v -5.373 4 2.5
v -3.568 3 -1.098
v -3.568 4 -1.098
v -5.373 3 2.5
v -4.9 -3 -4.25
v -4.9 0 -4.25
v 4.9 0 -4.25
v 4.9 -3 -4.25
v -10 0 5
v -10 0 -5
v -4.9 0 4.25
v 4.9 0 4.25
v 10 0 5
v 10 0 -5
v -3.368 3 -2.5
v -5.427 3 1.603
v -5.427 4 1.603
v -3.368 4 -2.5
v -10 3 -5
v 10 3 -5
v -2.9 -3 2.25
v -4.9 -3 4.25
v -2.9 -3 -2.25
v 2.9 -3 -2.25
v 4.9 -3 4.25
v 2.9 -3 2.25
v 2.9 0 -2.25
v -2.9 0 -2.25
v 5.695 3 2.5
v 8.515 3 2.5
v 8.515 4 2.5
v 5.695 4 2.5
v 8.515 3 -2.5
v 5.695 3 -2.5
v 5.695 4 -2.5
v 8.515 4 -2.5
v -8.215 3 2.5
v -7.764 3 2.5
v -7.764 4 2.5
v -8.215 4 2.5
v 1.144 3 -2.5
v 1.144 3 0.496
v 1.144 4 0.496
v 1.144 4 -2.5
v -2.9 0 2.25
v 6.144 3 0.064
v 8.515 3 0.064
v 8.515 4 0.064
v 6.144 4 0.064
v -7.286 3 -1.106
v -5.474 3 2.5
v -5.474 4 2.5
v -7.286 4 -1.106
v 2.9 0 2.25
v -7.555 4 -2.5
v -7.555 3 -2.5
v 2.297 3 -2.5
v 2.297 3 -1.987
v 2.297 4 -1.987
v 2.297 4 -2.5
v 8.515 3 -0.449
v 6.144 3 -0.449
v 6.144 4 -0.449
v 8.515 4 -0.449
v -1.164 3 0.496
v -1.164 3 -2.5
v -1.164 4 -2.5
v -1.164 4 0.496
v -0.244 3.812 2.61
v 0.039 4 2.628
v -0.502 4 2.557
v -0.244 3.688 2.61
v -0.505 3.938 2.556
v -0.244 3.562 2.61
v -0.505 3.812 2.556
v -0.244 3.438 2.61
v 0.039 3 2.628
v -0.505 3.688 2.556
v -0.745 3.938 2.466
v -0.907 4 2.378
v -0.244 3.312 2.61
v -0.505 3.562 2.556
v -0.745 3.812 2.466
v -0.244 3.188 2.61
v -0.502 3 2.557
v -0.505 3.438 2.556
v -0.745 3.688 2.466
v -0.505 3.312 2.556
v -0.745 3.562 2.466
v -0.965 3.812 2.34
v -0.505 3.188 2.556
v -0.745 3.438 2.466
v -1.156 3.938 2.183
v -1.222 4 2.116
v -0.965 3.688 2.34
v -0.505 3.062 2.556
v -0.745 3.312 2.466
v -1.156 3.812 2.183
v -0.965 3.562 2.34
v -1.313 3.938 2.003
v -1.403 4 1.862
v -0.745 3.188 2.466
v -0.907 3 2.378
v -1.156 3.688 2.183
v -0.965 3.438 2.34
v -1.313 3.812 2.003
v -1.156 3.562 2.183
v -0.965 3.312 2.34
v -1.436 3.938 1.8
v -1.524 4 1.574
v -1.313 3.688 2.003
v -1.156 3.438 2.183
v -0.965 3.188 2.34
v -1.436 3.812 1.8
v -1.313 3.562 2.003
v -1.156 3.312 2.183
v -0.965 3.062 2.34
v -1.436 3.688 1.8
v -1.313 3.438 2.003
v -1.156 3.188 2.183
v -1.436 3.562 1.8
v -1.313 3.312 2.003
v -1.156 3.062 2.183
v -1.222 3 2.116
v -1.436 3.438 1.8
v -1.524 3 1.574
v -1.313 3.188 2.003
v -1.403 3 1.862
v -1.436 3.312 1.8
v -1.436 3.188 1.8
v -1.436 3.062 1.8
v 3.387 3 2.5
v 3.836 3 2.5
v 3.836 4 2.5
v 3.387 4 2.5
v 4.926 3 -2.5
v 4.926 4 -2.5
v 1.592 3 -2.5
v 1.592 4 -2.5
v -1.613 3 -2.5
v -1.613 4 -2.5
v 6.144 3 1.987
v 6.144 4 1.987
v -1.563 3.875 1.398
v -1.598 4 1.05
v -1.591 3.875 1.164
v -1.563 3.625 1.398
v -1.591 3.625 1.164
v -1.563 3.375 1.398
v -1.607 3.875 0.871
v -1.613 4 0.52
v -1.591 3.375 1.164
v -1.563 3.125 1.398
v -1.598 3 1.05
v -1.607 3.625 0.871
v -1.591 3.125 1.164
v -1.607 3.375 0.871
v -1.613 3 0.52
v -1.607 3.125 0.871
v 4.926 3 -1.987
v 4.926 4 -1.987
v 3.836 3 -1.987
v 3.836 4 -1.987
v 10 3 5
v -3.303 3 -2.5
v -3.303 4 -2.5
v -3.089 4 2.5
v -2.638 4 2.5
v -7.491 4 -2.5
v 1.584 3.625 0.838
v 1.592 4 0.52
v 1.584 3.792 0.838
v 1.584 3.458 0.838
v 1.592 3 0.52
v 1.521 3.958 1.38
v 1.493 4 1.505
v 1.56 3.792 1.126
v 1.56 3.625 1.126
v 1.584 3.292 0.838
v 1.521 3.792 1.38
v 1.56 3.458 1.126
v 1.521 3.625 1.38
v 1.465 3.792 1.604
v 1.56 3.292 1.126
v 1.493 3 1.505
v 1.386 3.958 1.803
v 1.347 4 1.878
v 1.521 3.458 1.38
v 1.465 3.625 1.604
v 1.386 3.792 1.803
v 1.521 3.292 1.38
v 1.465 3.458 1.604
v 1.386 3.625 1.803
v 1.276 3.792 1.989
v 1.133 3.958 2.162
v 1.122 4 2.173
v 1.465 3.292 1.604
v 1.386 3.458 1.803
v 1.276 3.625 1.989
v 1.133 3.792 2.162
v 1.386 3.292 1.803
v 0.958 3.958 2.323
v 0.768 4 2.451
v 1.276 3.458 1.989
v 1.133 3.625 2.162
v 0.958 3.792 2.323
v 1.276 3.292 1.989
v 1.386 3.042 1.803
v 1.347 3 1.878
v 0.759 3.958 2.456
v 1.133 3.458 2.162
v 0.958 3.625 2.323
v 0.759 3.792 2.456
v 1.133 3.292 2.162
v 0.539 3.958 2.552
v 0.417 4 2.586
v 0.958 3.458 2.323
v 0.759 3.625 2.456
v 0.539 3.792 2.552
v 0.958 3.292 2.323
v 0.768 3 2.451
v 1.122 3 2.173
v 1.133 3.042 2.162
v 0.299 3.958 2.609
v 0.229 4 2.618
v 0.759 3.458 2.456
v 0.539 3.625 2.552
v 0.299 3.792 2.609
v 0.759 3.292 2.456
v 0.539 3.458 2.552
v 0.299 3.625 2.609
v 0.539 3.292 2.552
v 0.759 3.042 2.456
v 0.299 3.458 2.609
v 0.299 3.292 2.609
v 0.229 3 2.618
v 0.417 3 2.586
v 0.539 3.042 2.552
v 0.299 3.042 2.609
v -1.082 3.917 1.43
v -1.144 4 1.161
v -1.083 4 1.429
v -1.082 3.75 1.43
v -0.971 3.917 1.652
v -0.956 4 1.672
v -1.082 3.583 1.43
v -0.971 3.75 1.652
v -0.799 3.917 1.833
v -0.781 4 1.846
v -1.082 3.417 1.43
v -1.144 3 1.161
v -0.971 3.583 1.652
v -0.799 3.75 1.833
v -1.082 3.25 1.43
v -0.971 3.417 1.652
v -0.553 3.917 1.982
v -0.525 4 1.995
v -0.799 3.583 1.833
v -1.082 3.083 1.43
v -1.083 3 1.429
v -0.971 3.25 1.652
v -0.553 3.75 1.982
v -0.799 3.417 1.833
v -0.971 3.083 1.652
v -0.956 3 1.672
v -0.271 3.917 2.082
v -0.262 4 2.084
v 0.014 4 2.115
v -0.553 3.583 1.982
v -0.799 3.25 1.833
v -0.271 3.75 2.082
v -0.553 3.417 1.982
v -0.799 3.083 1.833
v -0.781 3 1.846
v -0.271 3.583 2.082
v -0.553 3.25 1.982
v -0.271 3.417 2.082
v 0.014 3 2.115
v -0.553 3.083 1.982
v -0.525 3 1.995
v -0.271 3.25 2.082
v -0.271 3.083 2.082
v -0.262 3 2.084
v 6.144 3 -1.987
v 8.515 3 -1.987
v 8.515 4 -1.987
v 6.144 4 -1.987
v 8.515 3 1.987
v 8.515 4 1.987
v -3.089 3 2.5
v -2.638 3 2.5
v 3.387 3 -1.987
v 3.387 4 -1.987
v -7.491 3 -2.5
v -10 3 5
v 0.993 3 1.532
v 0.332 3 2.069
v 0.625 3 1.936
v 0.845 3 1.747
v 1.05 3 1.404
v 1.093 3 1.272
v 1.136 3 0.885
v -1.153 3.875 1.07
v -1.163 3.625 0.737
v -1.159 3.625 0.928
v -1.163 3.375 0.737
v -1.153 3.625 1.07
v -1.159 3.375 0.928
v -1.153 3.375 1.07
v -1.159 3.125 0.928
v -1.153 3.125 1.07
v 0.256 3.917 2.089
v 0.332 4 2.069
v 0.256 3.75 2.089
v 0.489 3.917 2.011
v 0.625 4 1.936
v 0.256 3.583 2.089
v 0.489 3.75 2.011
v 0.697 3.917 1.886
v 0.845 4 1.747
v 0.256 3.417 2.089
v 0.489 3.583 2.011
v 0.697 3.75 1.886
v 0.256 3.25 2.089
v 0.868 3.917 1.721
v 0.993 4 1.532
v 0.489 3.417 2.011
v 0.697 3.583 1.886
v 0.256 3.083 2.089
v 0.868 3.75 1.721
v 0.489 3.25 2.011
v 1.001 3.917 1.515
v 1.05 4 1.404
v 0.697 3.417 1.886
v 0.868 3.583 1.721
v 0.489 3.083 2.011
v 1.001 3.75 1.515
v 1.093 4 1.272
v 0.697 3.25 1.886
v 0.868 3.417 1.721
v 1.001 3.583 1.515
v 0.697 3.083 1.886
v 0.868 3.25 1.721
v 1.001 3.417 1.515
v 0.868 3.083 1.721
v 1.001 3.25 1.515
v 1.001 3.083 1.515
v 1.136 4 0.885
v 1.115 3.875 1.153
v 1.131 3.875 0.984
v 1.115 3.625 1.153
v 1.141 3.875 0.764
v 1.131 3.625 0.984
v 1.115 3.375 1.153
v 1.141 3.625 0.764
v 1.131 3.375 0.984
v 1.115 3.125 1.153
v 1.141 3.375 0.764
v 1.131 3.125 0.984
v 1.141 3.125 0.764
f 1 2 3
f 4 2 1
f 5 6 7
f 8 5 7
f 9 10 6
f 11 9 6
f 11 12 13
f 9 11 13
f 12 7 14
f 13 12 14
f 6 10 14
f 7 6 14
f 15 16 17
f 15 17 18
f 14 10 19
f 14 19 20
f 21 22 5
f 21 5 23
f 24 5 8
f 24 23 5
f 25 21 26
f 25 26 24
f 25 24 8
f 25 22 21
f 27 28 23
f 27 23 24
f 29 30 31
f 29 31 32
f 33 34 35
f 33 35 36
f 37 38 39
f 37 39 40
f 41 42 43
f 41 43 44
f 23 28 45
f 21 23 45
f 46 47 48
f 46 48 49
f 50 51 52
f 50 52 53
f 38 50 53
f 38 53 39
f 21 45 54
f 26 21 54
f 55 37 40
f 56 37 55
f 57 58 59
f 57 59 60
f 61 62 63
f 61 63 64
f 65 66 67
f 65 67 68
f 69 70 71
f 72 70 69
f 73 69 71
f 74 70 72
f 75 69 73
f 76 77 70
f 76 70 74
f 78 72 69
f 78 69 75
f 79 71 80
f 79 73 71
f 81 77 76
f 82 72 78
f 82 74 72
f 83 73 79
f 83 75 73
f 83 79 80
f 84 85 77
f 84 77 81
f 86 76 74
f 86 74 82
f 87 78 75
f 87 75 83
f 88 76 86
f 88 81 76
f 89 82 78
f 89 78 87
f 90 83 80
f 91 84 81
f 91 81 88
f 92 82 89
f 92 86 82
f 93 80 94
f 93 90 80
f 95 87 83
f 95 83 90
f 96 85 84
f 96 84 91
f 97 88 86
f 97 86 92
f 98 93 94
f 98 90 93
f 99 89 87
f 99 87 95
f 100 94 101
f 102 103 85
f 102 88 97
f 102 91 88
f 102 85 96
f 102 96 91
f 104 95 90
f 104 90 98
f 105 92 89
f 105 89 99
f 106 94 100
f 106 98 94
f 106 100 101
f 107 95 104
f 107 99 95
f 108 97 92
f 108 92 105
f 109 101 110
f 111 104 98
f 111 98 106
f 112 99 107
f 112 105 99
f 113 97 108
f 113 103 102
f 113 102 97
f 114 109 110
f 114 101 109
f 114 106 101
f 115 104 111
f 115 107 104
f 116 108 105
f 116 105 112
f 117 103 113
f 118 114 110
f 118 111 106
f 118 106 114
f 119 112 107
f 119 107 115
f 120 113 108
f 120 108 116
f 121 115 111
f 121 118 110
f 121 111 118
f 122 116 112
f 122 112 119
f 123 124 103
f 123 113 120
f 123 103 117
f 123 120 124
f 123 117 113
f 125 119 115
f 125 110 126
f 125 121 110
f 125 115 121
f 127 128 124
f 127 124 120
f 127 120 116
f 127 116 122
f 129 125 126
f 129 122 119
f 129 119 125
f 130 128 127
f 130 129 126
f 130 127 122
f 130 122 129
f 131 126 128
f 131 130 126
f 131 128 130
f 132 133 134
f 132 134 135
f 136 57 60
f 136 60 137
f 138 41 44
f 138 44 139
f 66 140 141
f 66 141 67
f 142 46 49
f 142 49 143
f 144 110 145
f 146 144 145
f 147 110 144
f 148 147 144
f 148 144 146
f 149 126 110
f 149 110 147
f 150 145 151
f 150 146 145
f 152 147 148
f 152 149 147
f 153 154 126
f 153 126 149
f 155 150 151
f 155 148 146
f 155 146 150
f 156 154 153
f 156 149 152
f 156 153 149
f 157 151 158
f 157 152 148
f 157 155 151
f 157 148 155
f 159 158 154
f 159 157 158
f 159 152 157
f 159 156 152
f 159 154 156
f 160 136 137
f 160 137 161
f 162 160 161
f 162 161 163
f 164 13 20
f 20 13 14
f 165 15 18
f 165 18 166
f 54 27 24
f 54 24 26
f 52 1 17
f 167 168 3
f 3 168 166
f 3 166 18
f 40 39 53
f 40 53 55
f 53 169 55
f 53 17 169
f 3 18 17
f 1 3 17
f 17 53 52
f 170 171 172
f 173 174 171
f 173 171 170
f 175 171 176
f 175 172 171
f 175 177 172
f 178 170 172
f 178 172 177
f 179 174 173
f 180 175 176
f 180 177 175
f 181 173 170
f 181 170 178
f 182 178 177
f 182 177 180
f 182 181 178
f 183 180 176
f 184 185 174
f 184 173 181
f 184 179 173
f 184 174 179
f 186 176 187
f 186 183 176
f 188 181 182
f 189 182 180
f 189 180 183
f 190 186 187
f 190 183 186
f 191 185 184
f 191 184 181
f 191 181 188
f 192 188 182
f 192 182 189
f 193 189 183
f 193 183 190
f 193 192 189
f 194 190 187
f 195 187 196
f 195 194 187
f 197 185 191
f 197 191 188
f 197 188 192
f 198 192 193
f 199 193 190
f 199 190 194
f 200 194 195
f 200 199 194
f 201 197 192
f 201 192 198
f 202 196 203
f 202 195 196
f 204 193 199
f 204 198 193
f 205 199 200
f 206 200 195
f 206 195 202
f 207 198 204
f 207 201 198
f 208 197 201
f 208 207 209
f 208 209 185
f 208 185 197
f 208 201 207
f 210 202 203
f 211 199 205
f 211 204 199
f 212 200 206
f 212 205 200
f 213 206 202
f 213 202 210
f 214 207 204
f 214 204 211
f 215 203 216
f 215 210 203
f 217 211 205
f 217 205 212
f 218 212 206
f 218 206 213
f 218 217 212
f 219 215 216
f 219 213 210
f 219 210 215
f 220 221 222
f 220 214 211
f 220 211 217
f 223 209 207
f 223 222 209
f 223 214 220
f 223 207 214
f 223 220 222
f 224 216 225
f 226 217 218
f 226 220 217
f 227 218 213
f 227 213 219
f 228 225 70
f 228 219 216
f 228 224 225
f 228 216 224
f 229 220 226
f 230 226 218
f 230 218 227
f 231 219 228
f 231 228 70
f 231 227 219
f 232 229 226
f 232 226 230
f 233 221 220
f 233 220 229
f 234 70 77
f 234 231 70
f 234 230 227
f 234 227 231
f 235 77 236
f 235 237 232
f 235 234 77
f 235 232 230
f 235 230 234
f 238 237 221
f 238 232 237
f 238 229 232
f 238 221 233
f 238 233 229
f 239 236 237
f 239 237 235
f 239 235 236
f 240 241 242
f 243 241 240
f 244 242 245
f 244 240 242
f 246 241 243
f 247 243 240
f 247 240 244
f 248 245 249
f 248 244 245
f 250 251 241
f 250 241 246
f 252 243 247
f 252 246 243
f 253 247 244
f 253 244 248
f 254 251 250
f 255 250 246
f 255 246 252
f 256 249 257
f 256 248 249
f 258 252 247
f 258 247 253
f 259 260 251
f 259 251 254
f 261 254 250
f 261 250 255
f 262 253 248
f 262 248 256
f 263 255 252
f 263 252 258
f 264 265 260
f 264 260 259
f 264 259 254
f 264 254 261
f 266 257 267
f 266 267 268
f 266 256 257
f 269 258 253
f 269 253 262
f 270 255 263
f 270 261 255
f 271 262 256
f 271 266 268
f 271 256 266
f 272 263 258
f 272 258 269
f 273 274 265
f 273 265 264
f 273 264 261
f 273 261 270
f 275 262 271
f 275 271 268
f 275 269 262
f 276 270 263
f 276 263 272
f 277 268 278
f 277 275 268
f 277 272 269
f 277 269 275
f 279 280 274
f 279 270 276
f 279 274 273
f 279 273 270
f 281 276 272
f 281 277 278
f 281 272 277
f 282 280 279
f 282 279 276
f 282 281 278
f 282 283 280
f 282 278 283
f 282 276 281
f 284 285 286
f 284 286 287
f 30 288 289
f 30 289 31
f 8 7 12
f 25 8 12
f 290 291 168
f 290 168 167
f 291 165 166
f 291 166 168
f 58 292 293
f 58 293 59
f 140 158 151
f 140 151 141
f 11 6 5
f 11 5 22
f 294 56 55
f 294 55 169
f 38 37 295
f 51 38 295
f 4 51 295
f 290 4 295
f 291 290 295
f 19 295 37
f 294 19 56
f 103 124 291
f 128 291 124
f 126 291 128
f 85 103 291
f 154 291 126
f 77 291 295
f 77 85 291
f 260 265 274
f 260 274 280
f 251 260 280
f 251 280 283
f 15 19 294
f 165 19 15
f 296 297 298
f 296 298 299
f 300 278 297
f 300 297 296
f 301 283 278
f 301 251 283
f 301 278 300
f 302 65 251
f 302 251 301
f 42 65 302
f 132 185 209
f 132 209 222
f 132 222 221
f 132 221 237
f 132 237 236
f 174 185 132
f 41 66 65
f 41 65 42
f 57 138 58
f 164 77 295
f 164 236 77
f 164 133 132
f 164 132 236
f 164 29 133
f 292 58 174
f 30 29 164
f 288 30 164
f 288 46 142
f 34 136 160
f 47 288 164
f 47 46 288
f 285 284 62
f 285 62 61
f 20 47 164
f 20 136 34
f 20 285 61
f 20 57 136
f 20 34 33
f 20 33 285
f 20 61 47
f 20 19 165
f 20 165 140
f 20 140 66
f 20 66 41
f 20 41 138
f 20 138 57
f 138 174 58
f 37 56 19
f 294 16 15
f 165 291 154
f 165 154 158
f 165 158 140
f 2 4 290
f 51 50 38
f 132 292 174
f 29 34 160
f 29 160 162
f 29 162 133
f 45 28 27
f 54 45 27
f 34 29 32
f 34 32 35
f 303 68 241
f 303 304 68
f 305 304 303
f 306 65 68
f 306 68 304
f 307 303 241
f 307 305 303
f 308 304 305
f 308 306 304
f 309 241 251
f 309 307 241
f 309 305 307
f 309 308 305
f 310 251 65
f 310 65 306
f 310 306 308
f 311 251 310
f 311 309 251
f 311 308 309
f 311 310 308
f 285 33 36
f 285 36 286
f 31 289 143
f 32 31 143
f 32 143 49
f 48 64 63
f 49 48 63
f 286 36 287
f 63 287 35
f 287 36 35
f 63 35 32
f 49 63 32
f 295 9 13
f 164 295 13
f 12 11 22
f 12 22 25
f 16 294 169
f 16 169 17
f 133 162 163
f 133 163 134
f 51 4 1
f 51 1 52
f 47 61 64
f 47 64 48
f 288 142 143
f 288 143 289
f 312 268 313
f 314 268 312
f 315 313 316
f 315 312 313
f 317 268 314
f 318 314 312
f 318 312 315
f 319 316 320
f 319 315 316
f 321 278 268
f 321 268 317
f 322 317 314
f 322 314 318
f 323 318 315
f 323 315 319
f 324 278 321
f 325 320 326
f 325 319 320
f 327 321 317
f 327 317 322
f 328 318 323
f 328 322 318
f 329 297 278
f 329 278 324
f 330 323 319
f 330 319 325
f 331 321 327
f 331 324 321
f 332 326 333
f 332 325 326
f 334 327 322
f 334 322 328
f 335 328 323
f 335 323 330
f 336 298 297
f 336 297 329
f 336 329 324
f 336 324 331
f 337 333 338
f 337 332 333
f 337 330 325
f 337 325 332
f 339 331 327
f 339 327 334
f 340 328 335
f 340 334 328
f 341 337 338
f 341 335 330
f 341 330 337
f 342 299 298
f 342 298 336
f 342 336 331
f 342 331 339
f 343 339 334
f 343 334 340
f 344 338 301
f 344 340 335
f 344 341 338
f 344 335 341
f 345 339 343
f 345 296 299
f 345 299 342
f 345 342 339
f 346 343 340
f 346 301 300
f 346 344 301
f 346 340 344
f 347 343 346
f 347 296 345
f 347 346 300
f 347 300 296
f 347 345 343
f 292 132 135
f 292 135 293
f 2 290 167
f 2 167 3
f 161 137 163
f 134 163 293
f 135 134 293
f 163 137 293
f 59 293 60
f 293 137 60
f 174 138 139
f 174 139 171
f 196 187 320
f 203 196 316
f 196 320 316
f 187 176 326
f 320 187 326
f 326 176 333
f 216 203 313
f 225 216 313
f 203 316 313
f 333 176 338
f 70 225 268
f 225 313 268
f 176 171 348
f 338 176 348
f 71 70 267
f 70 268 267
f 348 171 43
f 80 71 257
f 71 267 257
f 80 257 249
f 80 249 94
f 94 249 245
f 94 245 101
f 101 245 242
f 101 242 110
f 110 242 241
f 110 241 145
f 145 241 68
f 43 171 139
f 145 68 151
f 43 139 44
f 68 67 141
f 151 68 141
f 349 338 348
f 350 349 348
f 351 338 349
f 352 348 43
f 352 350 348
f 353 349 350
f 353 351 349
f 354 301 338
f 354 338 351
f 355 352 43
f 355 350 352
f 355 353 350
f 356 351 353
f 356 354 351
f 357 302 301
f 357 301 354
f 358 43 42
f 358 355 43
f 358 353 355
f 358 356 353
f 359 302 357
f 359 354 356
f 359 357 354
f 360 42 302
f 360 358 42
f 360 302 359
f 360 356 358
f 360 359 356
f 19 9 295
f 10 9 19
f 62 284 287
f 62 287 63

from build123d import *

# Parameters (mm, degrees)
SKETCH1_W           = 20
SKETCH1_H           = 10
BOSS_EXTRUDE1_DEPTH = 3
SKETCH2_W           = 9.8
SKETCH2_H           = 8.5
SKETCH2_W_2         = 5.8
SKETCH2_H_2         = 4.5
BOSS_EXTRUDE2_DEPTH = 3
BOSS_EXTRUDE3_DEPTH = 1


with BuildPart() as part:
    # Sketch1 → Boss-Extrude1 (new body)
    with BuildSketch(Plane(origin=(0, 0, 0), x_dir=(1, 0, 0), z_dir=(0, 1, 0))):
        Rectangle(SKETCH1_W, SKETCH1_H)
    extrude(amount=BOSS_EXTRUDE1_DEPTH)

    # Sketch2 → Boss-Extrude2 (add)
    with BuildSketch(Plane.XZ):
        Rectangle(SKETCH2_W, SKETCH2_H)
        Rectangle(SKETCH2_W_2, SKETCH2_H_2, mode=Mode.SUBTRACT)
    extrude(amount=BOSS_EXTRUDE2_DEPTH)

    # Sketch3 → Boss-Extrude3 (add)
    with BuildSketch(Plane(origin=(0, 3, 0), x_dir=(1, 0, 0), z_dir=(0, 1, 0))):
        Polygon((-8.215384615, -2.5), (-7.555328526, 2.5), (-7.491225962, 2.5), (-5.426923077, -1.602564103), (-3.367628205, 2.5), (-3.302524038, 2.5), (-2.638461538, -2.5), (-3.089182692, -2.5), (-3.567948718, 1.09775641), (-5.372836538, -2.5), (-5.473998397, -2.5), (-7.285897436, 1.105769231), (-7.763661859, -2.5), align=None)
        with BuildLine():
            Line((-1.612820513, 2.5), (-1.164102564, 2.5))
            Line((-1.164102564, 2.5), (-1.164102564, -0.495793269))
            add(Edge.make_bspline(
                [(-1.164102564, -0.495793269), (-1.164169341, -0.53819432), (-1.164296062, -0.618657622), (-1.163449614, -0.733183765), (-1.161079088, -0.835001564), (-1.159584574, -0.924503489), (-1.156259812, -1.001278843), (-1.153548316, -1.065743572), (-1.150061807, -1.117592433), (-1.145871639, -1.147850899), (-1.144070513, -1.160857372)],
                knots=[0, 0, 0, 0, 1.528628734, 2.90083645, 4.128790002, 5.200304208, 6.127813768, 6.898992206, 7.526736466, 8, 8, 8, 8], degree=3))
            add(Edge.make_bspline(
                [(-1.144070513, -1.160857372), (-1.136674143, -1.207781319), (-1.122298163, -1.298985218), (-1.08566048, -1.428854192), (-1.034492622, -1.545899133), (-0.973859703, -1.653772406), (-0.893955973, -1.749471491), (-0.798236637, -1.837630995), (-0.682268396, -1.914733574), (-0.553324674, -1.985234733), (-0.414345763, -2.041899137), (-0.272329668, -2.0847468), (-0.129411126, -2.110859514), (-0.033730891, -2.113883141), (0.013782051, -2.115384615)],
                knots=[0, 0, 0, 0, 1.035780045, 2.013197591, 2.933192213, 3.817615948, 4.702609284, 5.640816605, 6.646850145, 7.73207398, 8.84249596, 9.914020372, 10.964143139, 12, 12, 12, 12], degree=3))
            add(Edge.make_bspline(
                [(0.013782051, -2.115384615), (0.054573109, -2.113850544), (0.135919626, -2.11079126), (0.256785956, -2.091846359), (0.374500396, -2.057702694), (0.489644225, -2.013645896), (0.597574203, -1.955435051), (0.698350548, -1.888190995), (0.788299026, -1.809318315), (0.87038188, -1.722032109), (0.94186036, -1.62354668), (1.003819133, -1.516006483), (1.054570461, -1.39779313), (1.07963264, -1.314715384), (1.092508013, -1.272035256)],
                knots=[0, 0, 0, 0, 0.994687771, 1.983630487, 2.973142513, 3.978332533, 4.983357753, 5.956394766, 6.925816176, 7.893390482, 8.871859704, 9.88551698, 10.913711441, 12, 12, 12, 12], degree=3))
            add(Edge.make_bspline(
                [(1.092508013, -1.272035256), (1.096793906, -1.254394436), (1.106344604, -1.215083579), (1.115268954, -1.148624592), (1.12456399, -1.070211215), (1.131013376, -0.979280054), (1.137300833, -0.876135807), (1.141062366, -0.760241154), (1.142800984, -0.632016924), (1.143319099, -0.542535264), (1.143589744, -0.495793269)],
                knots=[0, 0, 0, 0, 0.558680831, 1.244966039, 2.062412453, 2.990489873, 4.051219941, 5.244515665, 6.560634259, 8, 8, 8, 8], degree=3))
            Line((1.143589744, -0.495793269), (1.143589744, 2.5))
            Line((1.143589744, 2.5), (1.592307692, 2.5))
            Line((1.592307692, 2.5), (1.592307692, -0.519831731))
            add(Edge.make_bspline(
                [(1.592307692, -0.519831731), (1.591944663, -0.574257986), (1.59123619, -0.680474133), (1.585092509, -0.836118932), (1.575296795, -0.983766048), (1.561456669, -1.123435329), (1.543118093, -1.254626985), (1.522724921, -1.37849094), (1.49675416, -1.494138072), (1.466420729, -1.602470097), (1.431744232, -1.705592259), (1.386828306, -1.803461709), (1.336221878, -1.899053708), (1.276200945, -1.990922435), (1.208756112, -2.079474654), (1.132396569, -2.164173332), (1.049647767, -2.24637197), (0.959134111, -2.323962064), (0.862347646, -2.395117317), (0.759576278, -2.457685562), (0.651609464, -2.510576444), (0.538727855, -2.554113479), (0.42088328, -2.58684862), (0.298072766, -2.6112417), (0.170016775, -2.625102125), (0.082924409, -2.627162025), (0.038822115, -2.628205128)],
                knots=[0, 0, 0, 0, 1.316592851, 2.569410997, 3.76748051, 4.895814652, 5.963796859, 6.97159953, 7.931736103, 8.829262218, 9.692595152, 10.560224239, 11.431080259, 12.30701507, 13.211635791, 14.121146779, 15.063487852, 16.031507147, 17.00238618, 17.966455255, 18.938106653, 19.907068911, 20.888905087, 21.893141452, 22.933117798, 24, 24, 24, 24], degree=3))
            add(Edge.make_bspline(
                [(0.038822115, -2.628205128), (-0.009276603, -2.627084035), (-0.103646115, -2.624884454), (-0.242700497, -2.612280525), (-0.376006492, -2.588539962), (-0.50497203, -2.558311471), (-0.627841312, -2.516620418), (-0.746260518, -2.467908811), (-0.858201491, -2.408084153), (-0.965480247, -2.341522163), (-1.065229898, -2.266629823), (-1.156797617, -2.185001003), (-1.240334575, -2.097943321), (-1.314432713, -2.004514227), (-1.380319691, -1.90544036), (-1.437077138, -1.800441446), (-1.485810344, -1.689558137), (-1.510962583, -1.612482137), (-1.523677885, -1.573517628)],
                knots=[0, 0, 0, 0, 1.13879206, 2.234305948, 3.301075583, 4.341971843, 5.366689343, 6.369221514, 7.369726634, 8.367512178, 9.355451585, 10.318319045, 11.268648973, 12.207971039, 13.137398894, 14.081662264, 15.030215811, 16, 16, 16, 16], degree=3))
            add(Edge.make_bspline(
                [(-1.523677885, -1.573517628), (-1.531073825, -1.546899665), (-1.547115784, -1.489164709), (-1.564294781, -1.393612583), (-1.578736326, -1.283591272), (-1.592315695, -1.159093245), (-1.600328492, -1.020022007), (-1.607353404, -0.866437842), (-1.612870002, -0.698155039), (-1.61283747, -0.580934303), (-1.612820513, -0.519831731)],
                knots=[0, 0, 0, 0, 0.625038921, 1.35572334, 2.194682327, 3.136881307, 4.189498639, 5.346923369, 6.617055217, 8, 8, 8, 8], degree=3))
            Line((-1.612820513, -0.519831731), (-1.612820513, 2.5))
        make_face()
        Polygon((2.297435897, 1.987179487), (2.297435897, 2.5), (4.925641026, 2.5), (4.925641026, 1.987179487), (3.835897436, 1.987179487), (3.835897436, -2.5), (3.387179487, -2.5), (3.387179487, 1.987179487), align=None)
        Polygon((5.694871795, 2.5), (8.515384615, 2.5), (8.515384615, 1.987179487), (6.143589744, 1.987179487), (6.143589744, 0.448717949), (8.515384615, 0.448717949), (8.515384615, -0.064102564), (6.143589744, -0.064102564), (6.143589744, -1.987179487), (8.515384615, -1.987179487), (8.515384615, -2.5), (5.694871795, -2.5), align=None)
    extrude(amount=BOSS_EXTRUDE3_DEPTH)


solid = part.part
